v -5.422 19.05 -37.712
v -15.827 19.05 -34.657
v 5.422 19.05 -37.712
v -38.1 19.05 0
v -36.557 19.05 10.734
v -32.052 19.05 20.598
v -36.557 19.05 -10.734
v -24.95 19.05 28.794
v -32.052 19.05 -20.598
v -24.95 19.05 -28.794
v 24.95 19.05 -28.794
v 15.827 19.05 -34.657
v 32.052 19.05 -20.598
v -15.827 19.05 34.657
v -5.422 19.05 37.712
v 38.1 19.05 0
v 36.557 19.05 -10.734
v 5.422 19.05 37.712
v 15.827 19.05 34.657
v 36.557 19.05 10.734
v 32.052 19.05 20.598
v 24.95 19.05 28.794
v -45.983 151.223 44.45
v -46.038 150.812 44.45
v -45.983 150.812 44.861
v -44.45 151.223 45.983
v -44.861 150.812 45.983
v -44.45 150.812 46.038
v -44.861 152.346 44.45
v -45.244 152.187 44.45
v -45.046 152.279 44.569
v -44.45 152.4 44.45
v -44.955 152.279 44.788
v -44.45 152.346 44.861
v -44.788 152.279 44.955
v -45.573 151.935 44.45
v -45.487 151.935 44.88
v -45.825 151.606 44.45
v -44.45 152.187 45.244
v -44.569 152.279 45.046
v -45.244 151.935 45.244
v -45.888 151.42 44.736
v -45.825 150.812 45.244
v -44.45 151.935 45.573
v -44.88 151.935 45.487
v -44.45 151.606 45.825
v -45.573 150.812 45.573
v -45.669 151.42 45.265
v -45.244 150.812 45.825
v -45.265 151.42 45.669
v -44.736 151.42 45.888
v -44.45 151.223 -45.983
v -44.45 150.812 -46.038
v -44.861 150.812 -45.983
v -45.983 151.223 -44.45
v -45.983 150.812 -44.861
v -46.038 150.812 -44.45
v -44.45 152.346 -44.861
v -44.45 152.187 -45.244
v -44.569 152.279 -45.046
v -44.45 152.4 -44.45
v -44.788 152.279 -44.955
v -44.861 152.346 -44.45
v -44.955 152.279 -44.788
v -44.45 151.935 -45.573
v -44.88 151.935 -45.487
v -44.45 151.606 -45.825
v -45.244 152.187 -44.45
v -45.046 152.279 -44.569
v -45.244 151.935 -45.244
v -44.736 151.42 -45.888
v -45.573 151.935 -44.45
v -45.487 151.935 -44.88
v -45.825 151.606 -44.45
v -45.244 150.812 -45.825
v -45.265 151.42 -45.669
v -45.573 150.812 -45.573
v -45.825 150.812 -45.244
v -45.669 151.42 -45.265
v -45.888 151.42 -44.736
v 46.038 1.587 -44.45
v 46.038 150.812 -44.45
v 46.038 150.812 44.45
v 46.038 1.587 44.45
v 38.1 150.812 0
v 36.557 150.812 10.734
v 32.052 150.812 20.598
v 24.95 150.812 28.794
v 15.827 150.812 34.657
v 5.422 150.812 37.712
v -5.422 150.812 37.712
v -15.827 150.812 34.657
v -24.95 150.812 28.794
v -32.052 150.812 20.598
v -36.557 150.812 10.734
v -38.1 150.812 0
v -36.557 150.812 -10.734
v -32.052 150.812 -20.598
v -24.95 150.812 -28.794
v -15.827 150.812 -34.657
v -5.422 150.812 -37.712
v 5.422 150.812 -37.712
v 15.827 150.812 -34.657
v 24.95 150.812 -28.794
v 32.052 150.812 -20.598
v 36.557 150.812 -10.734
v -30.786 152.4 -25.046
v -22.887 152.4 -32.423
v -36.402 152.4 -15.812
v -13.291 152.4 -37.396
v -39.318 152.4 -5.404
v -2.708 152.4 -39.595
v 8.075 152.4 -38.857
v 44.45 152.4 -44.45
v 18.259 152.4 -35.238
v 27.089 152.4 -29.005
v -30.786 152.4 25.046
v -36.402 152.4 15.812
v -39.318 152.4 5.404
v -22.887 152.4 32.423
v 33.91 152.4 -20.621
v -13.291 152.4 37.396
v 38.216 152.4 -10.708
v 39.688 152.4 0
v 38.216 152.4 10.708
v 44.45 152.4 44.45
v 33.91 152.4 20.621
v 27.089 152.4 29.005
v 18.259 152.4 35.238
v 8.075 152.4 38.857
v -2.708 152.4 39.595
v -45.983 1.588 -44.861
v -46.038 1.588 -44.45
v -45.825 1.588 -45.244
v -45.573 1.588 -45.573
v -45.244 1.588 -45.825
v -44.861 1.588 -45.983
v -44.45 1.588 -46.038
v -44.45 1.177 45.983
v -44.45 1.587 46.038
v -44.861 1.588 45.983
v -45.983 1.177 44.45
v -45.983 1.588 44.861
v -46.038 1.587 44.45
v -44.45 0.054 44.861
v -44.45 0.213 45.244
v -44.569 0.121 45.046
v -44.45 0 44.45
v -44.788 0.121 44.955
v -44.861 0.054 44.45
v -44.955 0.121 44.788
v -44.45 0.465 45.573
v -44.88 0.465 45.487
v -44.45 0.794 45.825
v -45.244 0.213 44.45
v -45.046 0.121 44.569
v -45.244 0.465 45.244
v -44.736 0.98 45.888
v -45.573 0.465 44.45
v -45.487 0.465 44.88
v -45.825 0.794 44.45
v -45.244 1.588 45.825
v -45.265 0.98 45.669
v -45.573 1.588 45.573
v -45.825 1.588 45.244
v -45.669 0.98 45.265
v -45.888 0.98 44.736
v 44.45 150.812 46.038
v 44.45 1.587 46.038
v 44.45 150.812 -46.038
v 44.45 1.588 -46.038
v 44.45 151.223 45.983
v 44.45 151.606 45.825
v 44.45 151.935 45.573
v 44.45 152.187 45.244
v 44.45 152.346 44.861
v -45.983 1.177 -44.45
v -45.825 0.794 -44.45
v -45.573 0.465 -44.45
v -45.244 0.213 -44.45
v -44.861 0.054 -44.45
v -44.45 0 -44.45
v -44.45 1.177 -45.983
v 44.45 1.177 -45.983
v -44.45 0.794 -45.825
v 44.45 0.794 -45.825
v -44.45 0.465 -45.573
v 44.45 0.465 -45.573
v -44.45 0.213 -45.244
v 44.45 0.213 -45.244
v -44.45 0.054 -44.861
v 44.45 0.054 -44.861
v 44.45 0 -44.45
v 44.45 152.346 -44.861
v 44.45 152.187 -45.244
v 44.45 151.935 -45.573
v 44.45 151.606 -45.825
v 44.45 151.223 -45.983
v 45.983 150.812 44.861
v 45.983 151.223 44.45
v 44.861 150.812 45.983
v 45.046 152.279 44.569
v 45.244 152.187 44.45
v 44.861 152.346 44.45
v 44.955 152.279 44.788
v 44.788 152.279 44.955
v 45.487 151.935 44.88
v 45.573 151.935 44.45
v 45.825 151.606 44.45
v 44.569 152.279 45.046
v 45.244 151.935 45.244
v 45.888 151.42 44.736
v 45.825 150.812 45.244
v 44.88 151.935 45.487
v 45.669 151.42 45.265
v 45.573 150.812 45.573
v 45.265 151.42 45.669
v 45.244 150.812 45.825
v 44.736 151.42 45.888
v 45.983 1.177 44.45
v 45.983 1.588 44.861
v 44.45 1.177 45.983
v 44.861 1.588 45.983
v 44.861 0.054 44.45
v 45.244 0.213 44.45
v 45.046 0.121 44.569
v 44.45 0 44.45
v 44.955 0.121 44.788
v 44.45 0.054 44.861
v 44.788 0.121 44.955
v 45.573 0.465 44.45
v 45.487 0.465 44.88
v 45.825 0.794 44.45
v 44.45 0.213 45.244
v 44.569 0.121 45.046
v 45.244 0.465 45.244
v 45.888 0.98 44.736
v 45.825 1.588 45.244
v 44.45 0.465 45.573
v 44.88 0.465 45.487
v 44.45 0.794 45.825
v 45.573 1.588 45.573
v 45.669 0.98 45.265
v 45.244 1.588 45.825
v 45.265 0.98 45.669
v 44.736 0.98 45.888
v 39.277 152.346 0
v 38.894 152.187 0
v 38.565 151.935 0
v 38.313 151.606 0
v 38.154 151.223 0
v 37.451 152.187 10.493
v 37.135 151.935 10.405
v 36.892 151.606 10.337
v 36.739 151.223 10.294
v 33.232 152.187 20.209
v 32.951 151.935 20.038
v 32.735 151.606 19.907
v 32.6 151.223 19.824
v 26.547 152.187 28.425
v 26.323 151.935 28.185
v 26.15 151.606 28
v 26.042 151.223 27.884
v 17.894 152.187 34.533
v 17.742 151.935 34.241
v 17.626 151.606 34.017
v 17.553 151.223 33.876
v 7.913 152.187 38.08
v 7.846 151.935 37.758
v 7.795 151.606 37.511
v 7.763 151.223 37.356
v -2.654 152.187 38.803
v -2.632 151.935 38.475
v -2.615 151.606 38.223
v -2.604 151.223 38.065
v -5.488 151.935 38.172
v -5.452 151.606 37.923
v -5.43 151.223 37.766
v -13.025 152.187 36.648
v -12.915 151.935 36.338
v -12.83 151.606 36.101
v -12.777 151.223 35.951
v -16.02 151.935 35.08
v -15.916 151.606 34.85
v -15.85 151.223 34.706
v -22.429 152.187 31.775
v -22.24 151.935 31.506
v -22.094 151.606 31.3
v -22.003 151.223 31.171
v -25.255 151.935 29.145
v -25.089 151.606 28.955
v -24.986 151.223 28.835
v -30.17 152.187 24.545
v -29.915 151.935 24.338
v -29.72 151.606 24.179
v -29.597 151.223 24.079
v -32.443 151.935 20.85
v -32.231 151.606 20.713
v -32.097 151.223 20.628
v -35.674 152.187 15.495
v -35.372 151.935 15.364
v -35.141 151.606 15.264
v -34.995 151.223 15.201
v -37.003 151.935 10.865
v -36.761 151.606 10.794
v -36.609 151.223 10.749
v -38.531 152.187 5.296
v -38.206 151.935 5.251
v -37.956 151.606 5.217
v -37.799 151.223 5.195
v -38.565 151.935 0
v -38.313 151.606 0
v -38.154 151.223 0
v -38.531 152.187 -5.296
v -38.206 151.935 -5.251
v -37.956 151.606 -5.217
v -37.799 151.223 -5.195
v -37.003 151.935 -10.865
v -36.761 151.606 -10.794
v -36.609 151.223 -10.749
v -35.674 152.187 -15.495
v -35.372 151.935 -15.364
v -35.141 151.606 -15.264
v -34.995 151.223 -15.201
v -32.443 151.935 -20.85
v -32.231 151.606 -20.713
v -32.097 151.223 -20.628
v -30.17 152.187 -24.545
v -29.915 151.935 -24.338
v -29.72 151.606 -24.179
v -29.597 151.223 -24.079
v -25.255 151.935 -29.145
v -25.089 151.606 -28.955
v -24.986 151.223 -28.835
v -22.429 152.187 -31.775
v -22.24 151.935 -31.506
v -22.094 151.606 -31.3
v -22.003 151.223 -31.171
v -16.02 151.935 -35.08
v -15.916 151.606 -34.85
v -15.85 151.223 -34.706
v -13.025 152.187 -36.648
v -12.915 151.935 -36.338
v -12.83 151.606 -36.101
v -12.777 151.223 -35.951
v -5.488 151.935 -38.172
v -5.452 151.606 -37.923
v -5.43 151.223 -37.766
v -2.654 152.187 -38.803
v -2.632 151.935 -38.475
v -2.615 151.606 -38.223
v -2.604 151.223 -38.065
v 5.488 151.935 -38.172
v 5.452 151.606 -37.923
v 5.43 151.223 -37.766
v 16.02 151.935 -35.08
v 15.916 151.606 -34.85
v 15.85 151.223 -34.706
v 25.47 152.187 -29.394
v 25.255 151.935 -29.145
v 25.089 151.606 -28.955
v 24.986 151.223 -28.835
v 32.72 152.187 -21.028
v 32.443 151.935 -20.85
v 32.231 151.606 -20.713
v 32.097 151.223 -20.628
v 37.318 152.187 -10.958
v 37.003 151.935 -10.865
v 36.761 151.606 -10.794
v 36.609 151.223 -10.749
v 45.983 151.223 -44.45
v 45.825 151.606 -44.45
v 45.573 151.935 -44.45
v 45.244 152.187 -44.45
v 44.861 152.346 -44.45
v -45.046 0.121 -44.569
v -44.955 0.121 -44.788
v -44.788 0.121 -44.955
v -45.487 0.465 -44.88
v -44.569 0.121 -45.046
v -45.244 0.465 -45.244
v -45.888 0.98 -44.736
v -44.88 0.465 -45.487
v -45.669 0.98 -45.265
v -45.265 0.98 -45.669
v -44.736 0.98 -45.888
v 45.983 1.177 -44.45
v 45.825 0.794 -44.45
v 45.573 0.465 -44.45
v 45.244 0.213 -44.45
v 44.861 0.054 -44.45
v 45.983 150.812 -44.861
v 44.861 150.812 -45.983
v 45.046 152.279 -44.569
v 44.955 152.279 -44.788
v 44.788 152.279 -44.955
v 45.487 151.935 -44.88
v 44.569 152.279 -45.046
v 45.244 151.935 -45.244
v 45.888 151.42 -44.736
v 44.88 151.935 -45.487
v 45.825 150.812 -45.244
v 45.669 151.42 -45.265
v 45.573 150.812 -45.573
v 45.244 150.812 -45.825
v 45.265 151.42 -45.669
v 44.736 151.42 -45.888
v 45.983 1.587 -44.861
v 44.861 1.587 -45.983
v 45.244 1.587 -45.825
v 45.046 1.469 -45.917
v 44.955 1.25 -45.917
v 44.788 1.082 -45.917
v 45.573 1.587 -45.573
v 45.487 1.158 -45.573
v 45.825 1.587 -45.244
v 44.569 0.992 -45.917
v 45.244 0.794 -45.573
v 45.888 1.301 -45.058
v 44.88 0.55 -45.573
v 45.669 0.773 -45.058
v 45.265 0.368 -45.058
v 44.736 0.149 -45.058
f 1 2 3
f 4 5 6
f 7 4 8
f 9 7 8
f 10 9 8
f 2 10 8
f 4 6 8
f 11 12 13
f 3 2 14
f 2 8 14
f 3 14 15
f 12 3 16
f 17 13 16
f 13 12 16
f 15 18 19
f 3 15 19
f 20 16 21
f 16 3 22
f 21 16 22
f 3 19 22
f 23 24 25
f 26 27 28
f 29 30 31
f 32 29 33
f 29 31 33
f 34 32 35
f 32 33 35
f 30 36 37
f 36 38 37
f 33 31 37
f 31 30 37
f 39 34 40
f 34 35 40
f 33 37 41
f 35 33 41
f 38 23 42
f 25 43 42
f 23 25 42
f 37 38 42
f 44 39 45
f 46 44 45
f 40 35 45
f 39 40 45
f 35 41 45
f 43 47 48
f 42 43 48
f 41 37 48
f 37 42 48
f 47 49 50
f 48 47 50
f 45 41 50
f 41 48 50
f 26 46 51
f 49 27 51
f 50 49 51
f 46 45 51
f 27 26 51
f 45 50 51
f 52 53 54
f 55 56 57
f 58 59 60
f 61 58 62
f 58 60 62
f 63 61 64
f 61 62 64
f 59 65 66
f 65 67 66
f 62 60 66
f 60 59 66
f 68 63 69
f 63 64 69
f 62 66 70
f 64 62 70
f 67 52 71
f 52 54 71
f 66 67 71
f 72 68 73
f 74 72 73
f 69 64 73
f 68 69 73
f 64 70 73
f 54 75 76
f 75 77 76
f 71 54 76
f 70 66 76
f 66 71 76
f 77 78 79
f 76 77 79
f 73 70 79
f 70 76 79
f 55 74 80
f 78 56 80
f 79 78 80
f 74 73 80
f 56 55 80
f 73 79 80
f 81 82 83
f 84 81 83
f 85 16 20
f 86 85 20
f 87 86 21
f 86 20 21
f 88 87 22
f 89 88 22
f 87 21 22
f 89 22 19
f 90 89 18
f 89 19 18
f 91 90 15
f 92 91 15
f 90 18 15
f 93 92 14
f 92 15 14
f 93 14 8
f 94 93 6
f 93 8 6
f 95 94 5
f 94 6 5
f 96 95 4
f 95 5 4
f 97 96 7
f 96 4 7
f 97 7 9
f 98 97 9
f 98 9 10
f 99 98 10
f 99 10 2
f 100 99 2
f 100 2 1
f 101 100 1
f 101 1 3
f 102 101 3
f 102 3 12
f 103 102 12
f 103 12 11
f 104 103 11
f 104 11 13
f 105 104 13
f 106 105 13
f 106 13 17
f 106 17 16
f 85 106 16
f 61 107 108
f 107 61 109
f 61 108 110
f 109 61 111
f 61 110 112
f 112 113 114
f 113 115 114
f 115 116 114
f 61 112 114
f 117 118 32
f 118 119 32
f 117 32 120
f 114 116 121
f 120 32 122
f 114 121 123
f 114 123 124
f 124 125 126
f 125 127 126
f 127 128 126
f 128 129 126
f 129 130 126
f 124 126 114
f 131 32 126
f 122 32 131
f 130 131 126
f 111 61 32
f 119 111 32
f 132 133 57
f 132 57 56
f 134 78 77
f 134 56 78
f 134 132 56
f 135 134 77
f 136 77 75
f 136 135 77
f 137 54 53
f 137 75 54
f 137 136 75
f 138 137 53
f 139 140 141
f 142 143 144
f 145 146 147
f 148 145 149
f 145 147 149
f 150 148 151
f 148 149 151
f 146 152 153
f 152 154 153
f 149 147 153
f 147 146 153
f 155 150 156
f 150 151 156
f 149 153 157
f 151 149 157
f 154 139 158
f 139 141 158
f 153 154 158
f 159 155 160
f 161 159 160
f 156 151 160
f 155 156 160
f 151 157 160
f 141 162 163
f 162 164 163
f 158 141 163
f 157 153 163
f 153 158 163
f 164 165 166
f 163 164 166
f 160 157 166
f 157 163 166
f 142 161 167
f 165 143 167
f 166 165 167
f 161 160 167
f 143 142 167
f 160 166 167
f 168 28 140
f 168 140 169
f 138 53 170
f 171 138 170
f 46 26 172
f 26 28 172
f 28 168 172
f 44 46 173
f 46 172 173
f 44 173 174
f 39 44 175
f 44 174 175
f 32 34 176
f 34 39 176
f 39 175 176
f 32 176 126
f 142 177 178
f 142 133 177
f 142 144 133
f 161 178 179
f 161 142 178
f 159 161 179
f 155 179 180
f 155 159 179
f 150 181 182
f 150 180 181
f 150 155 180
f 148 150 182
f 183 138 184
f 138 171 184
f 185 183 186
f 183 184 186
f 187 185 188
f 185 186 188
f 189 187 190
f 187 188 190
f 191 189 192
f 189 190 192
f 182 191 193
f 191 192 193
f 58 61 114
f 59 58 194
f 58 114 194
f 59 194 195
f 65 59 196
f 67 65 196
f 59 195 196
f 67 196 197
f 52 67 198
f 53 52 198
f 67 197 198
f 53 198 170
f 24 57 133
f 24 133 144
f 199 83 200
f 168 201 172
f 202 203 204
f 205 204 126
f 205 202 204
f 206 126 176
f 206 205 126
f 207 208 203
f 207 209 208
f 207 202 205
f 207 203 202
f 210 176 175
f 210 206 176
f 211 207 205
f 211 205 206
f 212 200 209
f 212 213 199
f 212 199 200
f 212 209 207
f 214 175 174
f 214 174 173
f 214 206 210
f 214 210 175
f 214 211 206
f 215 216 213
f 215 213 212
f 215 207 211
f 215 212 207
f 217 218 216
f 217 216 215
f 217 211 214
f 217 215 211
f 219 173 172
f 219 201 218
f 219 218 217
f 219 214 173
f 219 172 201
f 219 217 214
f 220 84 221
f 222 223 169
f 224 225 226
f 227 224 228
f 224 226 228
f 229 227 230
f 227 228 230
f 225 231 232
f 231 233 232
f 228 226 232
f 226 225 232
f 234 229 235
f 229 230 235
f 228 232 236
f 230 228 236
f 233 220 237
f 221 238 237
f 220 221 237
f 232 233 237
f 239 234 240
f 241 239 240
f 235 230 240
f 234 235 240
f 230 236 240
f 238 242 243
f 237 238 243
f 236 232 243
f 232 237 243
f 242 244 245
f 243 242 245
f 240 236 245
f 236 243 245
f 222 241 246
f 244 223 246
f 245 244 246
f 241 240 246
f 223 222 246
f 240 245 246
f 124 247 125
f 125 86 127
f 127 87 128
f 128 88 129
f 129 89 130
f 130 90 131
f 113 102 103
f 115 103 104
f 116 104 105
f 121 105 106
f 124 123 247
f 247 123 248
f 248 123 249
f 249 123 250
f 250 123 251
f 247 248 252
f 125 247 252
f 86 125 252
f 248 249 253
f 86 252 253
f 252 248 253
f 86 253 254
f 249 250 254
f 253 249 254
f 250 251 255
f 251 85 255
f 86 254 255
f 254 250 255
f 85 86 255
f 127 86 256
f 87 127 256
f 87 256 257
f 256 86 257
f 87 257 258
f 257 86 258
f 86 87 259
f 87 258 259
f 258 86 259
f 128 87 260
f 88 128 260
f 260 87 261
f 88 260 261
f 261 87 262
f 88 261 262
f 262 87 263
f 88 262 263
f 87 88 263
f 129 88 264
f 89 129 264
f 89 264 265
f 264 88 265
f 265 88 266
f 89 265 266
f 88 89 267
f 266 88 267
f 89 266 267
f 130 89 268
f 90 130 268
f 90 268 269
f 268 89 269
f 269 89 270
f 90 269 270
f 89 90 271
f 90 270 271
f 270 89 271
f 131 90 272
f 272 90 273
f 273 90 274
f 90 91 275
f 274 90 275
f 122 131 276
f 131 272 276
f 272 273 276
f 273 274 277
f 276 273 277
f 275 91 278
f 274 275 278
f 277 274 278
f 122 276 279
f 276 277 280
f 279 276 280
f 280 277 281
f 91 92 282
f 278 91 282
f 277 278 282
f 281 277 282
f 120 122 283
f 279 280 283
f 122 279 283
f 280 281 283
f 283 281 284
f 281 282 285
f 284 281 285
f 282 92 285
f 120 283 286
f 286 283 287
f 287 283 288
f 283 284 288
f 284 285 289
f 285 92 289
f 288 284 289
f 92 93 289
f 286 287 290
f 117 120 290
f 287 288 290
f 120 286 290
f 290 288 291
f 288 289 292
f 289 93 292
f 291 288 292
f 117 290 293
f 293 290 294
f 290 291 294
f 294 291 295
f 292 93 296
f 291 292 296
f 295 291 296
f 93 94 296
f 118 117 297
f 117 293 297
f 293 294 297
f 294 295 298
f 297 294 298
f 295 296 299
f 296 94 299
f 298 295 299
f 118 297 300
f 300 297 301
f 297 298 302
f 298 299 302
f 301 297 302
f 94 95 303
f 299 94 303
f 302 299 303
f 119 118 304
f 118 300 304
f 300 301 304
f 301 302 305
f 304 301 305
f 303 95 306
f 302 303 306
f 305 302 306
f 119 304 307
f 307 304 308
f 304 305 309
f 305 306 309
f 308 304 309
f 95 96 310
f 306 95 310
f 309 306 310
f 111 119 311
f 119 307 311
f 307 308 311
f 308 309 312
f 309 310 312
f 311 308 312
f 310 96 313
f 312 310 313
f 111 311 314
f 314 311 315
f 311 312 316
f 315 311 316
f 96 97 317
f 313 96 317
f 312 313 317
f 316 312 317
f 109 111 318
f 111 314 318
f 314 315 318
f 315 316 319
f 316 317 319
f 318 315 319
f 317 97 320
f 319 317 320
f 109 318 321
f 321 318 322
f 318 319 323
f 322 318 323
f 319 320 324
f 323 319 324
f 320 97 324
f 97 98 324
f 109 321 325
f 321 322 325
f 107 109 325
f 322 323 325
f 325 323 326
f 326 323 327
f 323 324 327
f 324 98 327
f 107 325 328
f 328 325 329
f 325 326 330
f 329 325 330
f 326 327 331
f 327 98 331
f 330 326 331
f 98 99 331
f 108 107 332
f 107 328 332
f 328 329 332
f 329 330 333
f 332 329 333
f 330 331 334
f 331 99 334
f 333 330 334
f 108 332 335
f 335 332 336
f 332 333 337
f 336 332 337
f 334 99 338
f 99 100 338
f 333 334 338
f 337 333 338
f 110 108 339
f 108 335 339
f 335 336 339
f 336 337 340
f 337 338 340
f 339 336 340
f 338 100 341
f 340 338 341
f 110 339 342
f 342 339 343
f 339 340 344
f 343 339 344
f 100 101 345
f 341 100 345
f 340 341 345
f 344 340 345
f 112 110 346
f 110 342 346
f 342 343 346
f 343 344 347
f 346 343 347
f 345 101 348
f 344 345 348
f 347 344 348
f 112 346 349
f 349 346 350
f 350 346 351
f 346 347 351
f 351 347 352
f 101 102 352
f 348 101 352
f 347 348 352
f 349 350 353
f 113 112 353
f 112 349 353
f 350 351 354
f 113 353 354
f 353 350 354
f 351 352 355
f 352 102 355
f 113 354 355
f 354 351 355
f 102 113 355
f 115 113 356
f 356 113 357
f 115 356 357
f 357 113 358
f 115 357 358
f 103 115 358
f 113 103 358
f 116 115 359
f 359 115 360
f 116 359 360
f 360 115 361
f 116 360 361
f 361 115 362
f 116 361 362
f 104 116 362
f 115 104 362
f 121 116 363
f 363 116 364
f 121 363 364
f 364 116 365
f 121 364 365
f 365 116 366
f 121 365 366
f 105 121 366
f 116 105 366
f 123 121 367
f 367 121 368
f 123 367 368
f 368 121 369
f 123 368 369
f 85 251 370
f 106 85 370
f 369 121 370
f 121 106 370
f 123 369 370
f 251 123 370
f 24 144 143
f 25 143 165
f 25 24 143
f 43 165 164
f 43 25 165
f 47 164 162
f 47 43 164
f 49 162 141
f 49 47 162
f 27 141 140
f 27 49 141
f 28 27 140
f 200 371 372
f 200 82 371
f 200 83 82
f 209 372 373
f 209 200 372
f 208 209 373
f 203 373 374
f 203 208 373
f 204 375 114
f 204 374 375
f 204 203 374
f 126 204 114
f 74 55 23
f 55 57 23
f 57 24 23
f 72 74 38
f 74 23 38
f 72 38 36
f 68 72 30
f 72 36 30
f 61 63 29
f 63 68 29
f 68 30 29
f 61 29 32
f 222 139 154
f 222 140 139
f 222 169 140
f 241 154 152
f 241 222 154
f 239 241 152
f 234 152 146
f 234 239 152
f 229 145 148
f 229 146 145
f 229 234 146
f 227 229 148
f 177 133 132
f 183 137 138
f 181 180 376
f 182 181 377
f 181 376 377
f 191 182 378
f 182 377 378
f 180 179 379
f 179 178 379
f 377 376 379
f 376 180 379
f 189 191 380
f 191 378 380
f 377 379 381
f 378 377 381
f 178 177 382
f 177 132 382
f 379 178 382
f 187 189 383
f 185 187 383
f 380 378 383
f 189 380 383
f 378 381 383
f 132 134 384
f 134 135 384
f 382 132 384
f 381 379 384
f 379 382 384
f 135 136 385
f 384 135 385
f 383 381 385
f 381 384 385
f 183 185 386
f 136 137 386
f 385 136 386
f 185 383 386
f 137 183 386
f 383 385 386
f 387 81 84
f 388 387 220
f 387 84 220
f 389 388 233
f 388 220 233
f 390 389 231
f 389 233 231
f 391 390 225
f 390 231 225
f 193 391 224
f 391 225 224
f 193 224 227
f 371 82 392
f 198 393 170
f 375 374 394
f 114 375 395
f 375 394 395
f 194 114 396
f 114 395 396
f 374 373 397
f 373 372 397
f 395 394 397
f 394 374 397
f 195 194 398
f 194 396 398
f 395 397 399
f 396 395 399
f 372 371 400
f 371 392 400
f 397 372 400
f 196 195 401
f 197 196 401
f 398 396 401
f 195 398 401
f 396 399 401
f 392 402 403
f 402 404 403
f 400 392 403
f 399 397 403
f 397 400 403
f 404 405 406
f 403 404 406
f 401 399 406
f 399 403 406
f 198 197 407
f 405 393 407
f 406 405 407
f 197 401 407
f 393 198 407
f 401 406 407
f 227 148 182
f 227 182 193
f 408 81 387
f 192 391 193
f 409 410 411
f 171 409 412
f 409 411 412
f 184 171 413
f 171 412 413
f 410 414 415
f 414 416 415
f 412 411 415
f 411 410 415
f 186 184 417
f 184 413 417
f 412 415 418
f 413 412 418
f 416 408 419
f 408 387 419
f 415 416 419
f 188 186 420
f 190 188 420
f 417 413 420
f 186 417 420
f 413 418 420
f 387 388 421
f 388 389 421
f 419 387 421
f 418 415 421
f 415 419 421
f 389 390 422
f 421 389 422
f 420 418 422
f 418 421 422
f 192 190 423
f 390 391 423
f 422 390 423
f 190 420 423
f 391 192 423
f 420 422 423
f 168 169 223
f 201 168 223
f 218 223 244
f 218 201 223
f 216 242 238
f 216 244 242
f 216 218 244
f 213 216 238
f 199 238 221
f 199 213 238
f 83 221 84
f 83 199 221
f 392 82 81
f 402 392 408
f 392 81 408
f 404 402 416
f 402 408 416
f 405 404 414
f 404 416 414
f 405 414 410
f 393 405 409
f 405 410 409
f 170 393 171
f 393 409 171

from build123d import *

# Parameters (mm, degrees)
F0_W     = 92.075
F0_H     = 92.075
F0_R     = 38.1
F1_DEPTH = 152.4
F2_DEPTH = 19.05
F3_R     = 1.5875


with BuildPart() as f1:
    # F0 (on Front) → F1 (new body)
    with BuildSketch(Plane.XZ):
        Rectangle(F0_W, F0_H)
        Circle(F0_R, mode=Mode.SUBTRACT)
    extrude(amount=-F1_DEPTH)

    # F0 (on Front) → F2 (join)
    with BuildSketch(Plane.XZ):
        Rectangle(F0_W, F0_H)
        Circle(F0_R, mode=Mode.SUBTRACT)
        Circle(F0_R)
    extrude(amount=-F2_DEPTH)

    # F3
    f3_edges = [f1.edges().sort_by_distance(p)[0] for p in [
        (-46.0375, 76.2, 46.0375),
        (-46.0375, 76.2, -46.0375),
        (46.0375, 76.2, 46.0375),
        (46.0375, 0, 0),
        (46.0375, 76.2, -46.0375),
        (46.0375, 152.4, 0),
        (0, 0, 46.0375),
        (-46.0375, 0, 0),
        (0, 0, -46.0375),
        (0, 152.4, -46.0375),
        (-46.0375, 152.4, 0),
        (0, 152.4, 46.0375),
        (-38.1, 152.4, 0),
    ]]
    fillet(f3_edges, radius=F3_R)


solid = f1.part
